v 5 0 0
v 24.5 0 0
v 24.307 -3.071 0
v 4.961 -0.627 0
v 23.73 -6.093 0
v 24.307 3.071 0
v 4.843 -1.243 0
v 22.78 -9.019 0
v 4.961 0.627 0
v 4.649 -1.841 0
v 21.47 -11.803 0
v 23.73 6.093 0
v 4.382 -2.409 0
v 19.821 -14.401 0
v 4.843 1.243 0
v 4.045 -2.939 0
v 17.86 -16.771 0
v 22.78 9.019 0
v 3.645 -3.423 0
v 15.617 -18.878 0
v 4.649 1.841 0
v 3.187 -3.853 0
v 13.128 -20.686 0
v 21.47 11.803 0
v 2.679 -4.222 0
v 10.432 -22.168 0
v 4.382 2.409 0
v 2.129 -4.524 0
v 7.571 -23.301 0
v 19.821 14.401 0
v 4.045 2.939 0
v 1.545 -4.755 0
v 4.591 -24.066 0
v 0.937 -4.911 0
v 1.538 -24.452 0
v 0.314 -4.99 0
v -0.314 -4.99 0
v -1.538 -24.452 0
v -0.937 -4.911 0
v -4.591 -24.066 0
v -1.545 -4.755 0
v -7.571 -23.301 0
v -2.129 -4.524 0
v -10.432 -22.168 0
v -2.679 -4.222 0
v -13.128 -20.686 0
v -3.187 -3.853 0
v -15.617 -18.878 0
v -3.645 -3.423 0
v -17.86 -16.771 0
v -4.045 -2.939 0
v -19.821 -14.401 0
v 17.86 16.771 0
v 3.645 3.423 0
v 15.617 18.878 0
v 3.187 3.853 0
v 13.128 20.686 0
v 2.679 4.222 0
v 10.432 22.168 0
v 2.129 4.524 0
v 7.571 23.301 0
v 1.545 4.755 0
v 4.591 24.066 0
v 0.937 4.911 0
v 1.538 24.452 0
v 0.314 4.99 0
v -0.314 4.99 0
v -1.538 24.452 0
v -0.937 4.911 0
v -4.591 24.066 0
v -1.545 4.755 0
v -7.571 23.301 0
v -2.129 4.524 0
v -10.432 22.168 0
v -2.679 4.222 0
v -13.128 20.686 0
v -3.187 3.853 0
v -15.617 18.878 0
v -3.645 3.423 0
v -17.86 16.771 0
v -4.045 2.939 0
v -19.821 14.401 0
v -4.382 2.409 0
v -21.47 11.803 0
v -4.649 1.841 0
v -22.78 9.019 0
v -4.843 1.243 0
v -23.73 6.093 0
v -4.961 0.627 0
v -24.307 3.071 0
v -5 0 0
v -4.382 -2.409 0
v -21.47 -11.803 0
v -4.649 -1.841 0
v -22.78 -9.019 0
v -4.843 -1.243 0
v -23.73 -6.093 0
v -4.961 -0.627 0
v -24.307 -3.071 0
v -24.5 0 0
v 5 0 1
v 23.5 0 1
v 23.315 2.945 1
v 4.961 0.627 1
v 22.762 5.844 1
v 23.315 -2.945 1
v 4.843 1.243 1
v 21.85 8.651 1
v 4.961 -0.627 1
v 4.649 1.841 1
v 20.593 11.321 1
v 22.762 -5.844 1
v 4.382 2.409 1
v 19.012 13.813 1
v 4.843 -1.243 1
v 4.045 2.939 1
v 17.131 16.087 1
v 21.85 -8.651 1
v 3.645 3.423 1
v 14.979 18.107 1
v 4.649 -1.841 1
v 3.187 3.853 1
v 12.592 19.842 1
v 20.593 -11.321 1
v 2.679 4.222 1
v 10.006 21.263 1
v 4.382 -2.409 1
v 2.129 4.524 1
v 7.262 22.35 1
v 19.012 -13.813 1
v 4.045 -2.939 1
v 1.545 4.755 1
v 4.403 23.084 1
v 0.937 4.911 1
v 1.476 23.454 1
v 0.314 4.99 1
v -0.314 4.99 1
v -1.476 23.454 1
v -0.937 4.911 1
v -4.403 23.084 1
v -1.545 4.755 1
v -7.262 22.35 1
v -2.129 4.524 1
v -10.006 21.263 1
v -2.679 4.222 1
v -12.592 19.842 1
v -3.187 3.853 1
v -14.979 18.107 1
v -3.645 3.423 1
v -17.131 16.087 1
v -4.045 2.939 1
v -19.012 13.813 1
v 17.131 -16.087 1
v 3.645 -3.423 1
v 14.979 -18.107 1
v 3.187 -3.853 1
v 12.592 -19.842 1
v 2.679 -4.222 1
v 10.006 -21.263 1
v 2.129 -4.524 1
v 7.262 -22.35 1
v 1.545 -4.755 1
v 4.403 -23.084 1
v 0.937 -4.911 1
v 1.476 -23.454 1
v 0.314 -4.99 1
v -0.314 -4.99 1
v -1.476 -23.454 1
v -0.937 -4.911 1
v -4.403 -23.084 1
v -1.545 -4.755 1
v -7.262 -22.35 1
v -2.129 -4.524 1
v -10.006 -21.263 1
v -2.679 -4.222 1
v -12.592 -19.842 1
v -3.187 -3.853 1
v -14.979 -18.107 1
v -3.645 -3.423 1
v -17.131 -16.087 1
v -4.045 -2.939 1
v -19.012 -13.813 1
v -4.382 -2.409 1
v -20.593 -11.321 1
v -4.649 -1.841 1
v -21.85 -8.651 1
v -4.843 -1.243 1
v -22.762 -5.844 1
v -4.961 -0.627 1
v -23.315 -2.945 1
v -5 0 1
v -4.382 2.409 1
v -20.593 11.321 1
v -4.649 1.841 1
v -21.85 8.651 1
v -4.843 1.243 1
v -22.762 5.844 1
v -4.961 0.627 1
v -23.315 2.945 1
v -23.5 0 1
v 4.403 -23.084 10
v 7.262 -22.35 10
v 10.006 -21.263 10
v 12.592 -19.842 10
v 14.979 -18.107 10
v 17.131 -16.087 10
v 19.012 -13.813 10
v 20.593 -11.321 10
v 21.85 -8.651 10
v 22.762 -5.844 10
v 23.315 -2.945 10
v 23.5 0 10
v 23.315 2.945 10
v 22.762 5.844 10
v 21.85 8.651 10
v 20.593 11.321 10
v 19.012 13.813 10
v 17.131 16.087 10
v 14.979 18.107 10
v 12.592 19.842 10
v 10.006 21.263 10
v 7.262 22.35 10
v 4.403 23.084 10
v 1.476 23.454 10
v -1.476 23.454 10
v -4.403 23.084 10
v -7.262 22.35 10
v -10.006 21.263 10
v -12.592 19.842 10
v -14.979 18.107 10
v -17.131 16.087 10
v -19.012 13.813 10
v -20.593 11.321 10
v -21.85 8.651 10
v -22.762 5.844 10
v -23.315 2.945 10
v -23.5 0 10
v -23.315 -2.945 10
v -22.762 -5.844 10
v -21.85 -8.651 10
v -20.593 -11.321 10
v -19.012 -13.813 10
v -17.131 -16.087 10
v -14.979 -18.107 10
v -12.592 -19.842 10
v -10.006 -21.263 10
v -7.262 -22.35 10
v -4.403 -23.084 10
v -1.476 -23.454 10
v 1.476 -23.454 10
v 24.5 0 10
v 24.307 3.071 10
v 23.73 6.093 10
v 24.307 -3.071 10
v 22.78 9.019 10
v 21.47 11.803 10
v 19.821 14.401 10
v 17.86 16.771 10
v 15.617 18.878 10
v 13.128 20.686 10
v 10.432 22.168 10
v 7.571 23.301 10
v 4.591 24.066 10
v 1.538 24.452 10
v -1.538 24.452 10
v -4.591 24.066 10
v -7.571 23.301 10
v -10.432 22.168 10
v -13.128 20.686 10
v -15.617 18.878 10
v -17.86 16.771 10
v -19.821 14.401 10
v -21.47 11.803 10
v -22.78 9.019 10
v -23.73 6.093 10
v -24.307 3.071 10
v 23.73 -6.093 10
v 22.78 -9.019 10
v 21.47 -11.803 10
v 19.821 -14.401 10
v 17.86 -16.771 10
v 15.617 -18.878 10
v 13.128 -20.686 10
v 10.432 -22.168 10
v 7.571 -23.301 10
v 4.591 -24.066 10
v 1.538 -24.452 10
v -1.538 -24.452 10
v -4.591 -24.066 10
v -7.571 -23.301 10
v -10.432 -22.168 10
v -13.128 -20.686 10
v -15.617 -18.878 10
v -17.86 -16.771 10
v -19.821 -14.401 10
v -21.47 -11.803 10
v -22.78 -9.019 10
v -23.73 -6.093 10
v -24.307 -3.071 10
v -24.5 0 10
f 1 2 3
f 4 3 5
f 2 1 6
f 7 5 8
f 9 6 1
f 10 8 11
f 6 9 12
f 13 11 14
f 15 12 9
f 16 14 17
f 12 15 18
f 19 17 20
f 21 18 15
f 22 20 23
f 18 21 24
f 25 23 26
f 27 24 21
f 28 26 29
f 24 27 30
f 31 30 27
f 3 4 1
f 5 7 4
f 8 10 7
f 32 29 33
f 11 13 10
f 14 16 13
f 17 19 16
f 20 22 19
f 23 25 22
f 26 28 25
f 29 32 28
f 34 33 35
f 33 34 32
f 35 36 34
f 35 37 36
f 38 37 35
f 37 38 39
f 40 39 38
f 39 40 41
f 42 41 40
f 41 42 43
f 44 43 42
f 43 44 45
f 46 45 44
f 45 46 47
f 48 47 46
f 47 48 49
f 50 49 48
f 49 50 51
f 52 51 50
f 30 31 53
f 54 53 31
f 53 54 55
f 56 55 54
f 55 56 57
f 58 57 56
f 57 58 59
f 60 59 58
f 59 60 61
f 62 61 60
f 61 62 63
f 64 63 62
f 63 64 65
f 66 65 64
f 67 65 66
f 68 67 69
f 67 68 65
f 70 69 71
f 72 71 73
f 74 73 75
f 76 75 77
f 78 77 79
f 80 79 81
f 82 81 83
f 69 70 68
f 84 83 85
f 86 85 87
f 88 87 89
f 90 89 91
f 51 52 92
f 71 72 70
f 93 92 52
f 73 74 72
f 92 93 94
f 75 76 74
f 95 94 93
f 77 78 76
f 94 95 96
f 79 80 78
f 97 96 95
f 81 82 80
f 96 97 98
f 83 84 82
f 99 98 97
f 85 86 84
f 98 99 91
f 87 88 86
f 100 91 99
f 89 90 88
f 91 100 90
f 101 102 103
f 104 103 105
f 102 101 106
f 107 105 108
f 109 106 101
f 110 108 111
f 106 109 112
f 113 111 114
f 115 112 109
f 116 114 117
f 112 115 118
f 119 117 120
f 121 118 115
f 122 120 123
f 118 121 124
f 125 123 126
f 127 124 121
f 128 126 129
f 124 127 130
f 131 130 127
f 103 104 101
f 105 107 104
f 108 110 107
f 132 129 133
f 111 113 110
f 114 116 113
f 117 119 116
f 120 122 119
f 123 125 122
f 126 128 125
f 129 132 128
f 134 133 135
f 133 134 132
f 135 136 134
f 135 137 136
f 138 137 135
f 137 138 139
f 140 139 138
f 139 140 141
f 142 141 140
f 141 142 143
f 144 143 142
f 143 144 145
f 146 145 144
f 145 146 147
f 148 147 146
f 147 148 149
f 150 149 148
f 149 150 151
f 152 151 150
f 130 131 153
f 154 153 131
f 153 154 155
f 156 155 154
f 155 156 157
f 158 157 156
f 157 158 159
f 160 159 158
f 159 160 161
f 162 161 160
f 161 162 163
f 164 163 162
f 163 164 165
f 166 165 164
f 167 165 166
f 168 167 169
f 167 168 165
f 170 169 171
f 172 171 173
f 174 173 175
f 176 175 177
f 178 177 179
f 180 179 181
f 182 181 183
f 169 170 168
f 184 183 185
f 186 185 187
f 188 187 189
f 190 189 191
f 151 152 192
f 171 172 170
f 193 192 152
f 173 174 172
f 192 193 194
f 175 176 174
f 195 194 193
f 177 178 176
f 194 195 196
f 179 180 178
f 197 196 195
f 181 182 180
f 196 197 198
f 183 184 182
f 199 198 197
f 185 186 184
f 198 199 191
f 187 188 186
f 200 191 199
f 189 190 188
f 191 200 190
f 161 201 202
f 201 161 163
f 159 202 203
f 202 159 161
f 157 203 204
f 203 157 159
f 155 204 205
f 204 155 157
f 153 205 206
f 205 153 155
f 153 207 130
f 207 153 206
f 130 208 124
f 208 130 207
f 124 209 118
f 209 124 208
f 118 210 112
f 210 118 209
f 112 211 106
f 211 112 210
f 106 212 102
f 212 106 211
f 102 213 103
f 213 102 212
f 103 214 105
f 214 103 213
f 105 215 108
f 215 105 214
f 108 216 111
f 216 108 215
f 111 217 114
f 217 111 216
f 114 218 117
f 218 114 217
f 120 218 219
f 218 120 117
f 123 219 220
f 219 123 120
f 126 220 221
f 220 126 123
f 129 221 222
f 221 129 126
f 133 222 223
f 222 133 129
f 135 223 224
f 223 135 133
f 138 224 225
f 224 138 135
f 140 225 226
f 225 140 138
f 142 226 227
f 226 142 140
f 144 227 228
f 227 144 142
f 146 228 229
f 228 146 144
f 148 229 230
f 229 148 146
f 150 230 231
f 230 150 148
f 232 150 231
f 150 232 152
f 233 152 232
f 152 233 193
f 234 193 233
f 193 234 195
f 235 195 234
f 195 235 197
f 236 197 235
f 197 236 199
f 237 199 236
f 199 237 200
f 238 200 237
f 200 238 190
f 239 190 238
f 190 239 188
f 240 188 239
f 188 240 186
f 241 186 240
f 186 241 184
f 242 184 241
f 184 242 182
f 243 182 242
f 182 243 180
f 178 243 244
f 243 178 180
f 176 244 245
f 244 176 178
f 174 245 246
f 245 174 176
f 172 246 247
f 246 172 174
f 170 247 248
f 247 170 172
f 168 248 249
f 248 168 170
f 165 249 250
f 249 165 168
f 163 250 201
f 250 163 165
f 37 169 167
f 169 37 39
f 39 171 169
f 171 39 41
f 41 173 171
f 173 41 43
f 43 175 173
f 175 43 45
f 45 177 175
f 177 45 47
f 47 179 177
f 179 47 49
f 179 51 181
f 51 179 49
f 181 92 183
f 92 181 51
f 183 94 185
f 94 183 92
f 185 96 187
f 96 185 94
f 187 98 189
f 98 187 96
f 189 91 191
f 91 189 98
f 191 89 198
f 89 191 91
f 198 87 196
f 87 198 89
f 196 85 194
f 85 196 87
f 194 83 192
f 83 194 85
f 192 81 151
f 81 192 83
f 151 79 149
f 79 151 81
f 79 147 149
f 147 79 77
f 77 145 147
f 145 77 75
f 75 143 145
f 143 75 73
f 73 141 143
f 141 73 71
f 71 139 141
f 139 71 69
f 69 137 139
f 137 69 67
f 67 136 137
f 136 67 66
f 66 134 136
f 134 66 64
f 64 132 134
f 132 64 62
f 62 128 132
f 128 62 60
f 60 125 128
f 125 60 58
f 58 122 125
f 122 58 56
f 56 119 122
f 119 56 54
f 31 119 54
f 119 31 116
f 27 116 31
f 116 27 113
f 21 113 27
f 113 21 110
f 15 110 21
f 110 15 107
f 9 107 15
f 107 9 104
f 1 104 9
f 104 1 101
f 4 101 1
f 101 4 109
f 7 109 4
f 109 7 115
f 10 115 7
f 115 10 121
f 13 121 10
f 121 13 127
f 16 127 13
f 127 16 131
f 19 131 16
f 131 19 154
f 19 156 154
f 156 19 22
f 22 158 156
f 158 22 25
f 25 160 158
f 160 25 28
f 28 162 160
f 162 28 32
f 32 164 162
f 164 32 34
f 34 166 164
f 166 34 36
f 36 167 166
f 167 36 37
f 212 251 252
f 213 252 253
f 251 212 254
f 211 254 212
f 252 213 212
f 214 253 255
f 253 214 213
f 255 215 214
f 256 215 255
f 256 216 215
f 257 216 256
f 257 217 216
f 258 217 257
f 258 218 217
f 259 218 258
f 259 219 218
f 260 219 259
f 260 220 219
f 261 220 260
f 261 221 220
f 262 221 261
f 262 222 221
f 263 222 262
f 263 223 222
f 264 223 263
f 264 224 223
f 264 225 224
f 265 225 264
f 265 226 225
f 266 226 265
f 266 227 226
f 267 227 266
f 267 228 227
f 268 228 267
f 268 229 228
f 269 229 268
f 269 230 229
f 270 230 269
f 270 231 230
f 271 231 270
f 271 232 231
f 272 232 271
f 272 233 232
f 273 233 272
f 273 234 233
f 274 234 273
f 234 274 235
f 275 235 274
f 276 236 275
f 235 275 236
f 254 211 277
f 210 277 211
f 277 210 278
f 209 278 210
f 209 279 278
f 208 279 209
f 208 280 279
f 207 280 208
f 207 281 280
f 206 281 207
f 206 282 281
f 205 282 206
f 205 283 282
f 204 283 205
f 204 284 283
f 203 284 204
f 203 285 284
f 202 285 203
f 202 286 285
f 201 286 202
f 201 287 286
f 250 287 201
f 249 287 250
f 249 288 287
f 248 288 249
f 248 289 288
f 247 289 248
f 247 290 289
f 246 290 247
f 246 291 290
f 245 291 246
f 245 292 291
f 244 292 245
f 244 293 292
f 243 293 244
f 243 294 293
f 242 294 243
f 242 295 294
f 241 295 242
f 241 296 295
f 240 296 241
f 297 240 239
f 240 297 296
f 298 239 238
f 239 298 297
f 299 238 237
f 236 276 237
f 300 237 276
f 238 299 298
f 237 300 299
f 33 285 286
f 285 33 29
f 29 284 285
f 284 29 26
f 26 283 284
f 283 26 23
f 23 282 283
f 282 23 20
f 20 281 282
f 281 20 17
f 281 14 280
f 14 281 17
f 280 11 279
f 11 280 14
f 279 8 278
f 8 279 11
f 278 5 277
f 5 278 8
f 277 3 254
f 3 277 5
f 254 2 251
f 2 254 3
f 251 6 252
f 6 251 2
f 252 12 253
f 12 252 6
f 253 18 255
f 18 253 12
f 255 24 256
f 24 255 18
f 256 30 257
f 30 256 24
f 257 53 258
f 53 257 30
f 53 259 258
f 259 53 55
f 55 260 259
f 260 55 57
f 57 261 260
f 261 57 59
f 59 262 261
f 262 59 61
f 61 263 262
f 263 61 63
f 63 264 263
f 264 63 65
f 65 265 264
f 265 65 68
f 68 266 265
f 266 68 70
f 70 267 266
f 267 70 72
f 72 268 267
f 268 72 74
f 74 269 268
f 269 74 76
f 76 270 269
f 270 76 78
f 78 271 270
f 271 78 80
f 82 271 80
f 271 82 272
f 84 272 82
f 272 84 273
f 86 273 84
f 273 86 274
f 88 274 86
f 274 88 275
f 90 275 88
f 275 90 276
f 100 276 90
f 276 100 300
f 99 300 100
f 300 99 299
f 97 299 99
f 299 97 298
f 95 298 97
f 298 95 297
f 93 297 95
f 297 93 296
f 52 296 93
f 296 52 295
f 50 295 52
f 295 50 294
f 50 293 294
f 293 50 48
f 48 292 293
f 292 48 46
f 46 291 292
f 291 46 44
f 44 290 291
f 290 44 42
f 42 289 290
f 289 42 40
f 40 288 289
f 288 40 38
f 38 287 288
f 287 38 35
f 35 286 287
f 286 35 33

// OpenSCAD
/*
   Aperture Reducer Cap
   Andrew Lin, November 2021.
*/

/**************************
   Configuration Settings
***************************/

/*
   Number of facets to use when creating shapes. Larger is smoother,
   but will take longer to compute.
*/
$fn = 50;

/*
   Diameter of the thing the cap has to fit over, in millimeters.
   This could be the outer diameter of the OTA at the objective, or 
   the diameter of the cap holder on the OTA's main objective dust
   cover.
*/
ota_diameter = 46;

/*
   Amount of total extra space between the cap's wall and the OTA it
   is going over, in millimeters.
*/
padding = 1;

/*
   Diameter of hole to put in the printed cap, in millimeters.
*/
aperture = 10;

/*
   Aperture offset from center, in millimeters.
*/
aperture_offset = 0;

/*
   Thickness of the cap's outer wall, in millimeters.
*/
wall_thickness = 1;

/*
   Height of the outer wall, in millimeters.
*/
wall_height = 10;

/*
   Thickness of the face of the cap, in millimeters.
*/
face_thickness = 1;


/**************************
   Computed Values
***************************/

inner_diameter = ota_diameter + padding;
outer_diameter = inner_diameter + (2 * wall_thickness);


/**************************
   Modules
***************************/

/*
   Cap face. 
   The bit with the hole in it.
*/
module face(diameter, aperture, dx, thickness) {
    linear_extrude(height = thickness) {
        difference() {
            circle(d = diameter);
            translate([dx, 0, 0]) circle(d = aperture);
        }
    }
}

/*
   Cap wall.
   The bit that holds the cap on the OTA.
*/
module wall(id, od, h) {
    linear_extrude(height = h) {
        difference() {
            circle(d = od);
            circle(d = id);
        }
    }
}


/**************************
   Assembly.
***************************/

union() {
    face(inner_diameter, aperture, aperture_offset, face_thickness);
    wall(inner_diameter, outer_diameter, wall_height);
}
